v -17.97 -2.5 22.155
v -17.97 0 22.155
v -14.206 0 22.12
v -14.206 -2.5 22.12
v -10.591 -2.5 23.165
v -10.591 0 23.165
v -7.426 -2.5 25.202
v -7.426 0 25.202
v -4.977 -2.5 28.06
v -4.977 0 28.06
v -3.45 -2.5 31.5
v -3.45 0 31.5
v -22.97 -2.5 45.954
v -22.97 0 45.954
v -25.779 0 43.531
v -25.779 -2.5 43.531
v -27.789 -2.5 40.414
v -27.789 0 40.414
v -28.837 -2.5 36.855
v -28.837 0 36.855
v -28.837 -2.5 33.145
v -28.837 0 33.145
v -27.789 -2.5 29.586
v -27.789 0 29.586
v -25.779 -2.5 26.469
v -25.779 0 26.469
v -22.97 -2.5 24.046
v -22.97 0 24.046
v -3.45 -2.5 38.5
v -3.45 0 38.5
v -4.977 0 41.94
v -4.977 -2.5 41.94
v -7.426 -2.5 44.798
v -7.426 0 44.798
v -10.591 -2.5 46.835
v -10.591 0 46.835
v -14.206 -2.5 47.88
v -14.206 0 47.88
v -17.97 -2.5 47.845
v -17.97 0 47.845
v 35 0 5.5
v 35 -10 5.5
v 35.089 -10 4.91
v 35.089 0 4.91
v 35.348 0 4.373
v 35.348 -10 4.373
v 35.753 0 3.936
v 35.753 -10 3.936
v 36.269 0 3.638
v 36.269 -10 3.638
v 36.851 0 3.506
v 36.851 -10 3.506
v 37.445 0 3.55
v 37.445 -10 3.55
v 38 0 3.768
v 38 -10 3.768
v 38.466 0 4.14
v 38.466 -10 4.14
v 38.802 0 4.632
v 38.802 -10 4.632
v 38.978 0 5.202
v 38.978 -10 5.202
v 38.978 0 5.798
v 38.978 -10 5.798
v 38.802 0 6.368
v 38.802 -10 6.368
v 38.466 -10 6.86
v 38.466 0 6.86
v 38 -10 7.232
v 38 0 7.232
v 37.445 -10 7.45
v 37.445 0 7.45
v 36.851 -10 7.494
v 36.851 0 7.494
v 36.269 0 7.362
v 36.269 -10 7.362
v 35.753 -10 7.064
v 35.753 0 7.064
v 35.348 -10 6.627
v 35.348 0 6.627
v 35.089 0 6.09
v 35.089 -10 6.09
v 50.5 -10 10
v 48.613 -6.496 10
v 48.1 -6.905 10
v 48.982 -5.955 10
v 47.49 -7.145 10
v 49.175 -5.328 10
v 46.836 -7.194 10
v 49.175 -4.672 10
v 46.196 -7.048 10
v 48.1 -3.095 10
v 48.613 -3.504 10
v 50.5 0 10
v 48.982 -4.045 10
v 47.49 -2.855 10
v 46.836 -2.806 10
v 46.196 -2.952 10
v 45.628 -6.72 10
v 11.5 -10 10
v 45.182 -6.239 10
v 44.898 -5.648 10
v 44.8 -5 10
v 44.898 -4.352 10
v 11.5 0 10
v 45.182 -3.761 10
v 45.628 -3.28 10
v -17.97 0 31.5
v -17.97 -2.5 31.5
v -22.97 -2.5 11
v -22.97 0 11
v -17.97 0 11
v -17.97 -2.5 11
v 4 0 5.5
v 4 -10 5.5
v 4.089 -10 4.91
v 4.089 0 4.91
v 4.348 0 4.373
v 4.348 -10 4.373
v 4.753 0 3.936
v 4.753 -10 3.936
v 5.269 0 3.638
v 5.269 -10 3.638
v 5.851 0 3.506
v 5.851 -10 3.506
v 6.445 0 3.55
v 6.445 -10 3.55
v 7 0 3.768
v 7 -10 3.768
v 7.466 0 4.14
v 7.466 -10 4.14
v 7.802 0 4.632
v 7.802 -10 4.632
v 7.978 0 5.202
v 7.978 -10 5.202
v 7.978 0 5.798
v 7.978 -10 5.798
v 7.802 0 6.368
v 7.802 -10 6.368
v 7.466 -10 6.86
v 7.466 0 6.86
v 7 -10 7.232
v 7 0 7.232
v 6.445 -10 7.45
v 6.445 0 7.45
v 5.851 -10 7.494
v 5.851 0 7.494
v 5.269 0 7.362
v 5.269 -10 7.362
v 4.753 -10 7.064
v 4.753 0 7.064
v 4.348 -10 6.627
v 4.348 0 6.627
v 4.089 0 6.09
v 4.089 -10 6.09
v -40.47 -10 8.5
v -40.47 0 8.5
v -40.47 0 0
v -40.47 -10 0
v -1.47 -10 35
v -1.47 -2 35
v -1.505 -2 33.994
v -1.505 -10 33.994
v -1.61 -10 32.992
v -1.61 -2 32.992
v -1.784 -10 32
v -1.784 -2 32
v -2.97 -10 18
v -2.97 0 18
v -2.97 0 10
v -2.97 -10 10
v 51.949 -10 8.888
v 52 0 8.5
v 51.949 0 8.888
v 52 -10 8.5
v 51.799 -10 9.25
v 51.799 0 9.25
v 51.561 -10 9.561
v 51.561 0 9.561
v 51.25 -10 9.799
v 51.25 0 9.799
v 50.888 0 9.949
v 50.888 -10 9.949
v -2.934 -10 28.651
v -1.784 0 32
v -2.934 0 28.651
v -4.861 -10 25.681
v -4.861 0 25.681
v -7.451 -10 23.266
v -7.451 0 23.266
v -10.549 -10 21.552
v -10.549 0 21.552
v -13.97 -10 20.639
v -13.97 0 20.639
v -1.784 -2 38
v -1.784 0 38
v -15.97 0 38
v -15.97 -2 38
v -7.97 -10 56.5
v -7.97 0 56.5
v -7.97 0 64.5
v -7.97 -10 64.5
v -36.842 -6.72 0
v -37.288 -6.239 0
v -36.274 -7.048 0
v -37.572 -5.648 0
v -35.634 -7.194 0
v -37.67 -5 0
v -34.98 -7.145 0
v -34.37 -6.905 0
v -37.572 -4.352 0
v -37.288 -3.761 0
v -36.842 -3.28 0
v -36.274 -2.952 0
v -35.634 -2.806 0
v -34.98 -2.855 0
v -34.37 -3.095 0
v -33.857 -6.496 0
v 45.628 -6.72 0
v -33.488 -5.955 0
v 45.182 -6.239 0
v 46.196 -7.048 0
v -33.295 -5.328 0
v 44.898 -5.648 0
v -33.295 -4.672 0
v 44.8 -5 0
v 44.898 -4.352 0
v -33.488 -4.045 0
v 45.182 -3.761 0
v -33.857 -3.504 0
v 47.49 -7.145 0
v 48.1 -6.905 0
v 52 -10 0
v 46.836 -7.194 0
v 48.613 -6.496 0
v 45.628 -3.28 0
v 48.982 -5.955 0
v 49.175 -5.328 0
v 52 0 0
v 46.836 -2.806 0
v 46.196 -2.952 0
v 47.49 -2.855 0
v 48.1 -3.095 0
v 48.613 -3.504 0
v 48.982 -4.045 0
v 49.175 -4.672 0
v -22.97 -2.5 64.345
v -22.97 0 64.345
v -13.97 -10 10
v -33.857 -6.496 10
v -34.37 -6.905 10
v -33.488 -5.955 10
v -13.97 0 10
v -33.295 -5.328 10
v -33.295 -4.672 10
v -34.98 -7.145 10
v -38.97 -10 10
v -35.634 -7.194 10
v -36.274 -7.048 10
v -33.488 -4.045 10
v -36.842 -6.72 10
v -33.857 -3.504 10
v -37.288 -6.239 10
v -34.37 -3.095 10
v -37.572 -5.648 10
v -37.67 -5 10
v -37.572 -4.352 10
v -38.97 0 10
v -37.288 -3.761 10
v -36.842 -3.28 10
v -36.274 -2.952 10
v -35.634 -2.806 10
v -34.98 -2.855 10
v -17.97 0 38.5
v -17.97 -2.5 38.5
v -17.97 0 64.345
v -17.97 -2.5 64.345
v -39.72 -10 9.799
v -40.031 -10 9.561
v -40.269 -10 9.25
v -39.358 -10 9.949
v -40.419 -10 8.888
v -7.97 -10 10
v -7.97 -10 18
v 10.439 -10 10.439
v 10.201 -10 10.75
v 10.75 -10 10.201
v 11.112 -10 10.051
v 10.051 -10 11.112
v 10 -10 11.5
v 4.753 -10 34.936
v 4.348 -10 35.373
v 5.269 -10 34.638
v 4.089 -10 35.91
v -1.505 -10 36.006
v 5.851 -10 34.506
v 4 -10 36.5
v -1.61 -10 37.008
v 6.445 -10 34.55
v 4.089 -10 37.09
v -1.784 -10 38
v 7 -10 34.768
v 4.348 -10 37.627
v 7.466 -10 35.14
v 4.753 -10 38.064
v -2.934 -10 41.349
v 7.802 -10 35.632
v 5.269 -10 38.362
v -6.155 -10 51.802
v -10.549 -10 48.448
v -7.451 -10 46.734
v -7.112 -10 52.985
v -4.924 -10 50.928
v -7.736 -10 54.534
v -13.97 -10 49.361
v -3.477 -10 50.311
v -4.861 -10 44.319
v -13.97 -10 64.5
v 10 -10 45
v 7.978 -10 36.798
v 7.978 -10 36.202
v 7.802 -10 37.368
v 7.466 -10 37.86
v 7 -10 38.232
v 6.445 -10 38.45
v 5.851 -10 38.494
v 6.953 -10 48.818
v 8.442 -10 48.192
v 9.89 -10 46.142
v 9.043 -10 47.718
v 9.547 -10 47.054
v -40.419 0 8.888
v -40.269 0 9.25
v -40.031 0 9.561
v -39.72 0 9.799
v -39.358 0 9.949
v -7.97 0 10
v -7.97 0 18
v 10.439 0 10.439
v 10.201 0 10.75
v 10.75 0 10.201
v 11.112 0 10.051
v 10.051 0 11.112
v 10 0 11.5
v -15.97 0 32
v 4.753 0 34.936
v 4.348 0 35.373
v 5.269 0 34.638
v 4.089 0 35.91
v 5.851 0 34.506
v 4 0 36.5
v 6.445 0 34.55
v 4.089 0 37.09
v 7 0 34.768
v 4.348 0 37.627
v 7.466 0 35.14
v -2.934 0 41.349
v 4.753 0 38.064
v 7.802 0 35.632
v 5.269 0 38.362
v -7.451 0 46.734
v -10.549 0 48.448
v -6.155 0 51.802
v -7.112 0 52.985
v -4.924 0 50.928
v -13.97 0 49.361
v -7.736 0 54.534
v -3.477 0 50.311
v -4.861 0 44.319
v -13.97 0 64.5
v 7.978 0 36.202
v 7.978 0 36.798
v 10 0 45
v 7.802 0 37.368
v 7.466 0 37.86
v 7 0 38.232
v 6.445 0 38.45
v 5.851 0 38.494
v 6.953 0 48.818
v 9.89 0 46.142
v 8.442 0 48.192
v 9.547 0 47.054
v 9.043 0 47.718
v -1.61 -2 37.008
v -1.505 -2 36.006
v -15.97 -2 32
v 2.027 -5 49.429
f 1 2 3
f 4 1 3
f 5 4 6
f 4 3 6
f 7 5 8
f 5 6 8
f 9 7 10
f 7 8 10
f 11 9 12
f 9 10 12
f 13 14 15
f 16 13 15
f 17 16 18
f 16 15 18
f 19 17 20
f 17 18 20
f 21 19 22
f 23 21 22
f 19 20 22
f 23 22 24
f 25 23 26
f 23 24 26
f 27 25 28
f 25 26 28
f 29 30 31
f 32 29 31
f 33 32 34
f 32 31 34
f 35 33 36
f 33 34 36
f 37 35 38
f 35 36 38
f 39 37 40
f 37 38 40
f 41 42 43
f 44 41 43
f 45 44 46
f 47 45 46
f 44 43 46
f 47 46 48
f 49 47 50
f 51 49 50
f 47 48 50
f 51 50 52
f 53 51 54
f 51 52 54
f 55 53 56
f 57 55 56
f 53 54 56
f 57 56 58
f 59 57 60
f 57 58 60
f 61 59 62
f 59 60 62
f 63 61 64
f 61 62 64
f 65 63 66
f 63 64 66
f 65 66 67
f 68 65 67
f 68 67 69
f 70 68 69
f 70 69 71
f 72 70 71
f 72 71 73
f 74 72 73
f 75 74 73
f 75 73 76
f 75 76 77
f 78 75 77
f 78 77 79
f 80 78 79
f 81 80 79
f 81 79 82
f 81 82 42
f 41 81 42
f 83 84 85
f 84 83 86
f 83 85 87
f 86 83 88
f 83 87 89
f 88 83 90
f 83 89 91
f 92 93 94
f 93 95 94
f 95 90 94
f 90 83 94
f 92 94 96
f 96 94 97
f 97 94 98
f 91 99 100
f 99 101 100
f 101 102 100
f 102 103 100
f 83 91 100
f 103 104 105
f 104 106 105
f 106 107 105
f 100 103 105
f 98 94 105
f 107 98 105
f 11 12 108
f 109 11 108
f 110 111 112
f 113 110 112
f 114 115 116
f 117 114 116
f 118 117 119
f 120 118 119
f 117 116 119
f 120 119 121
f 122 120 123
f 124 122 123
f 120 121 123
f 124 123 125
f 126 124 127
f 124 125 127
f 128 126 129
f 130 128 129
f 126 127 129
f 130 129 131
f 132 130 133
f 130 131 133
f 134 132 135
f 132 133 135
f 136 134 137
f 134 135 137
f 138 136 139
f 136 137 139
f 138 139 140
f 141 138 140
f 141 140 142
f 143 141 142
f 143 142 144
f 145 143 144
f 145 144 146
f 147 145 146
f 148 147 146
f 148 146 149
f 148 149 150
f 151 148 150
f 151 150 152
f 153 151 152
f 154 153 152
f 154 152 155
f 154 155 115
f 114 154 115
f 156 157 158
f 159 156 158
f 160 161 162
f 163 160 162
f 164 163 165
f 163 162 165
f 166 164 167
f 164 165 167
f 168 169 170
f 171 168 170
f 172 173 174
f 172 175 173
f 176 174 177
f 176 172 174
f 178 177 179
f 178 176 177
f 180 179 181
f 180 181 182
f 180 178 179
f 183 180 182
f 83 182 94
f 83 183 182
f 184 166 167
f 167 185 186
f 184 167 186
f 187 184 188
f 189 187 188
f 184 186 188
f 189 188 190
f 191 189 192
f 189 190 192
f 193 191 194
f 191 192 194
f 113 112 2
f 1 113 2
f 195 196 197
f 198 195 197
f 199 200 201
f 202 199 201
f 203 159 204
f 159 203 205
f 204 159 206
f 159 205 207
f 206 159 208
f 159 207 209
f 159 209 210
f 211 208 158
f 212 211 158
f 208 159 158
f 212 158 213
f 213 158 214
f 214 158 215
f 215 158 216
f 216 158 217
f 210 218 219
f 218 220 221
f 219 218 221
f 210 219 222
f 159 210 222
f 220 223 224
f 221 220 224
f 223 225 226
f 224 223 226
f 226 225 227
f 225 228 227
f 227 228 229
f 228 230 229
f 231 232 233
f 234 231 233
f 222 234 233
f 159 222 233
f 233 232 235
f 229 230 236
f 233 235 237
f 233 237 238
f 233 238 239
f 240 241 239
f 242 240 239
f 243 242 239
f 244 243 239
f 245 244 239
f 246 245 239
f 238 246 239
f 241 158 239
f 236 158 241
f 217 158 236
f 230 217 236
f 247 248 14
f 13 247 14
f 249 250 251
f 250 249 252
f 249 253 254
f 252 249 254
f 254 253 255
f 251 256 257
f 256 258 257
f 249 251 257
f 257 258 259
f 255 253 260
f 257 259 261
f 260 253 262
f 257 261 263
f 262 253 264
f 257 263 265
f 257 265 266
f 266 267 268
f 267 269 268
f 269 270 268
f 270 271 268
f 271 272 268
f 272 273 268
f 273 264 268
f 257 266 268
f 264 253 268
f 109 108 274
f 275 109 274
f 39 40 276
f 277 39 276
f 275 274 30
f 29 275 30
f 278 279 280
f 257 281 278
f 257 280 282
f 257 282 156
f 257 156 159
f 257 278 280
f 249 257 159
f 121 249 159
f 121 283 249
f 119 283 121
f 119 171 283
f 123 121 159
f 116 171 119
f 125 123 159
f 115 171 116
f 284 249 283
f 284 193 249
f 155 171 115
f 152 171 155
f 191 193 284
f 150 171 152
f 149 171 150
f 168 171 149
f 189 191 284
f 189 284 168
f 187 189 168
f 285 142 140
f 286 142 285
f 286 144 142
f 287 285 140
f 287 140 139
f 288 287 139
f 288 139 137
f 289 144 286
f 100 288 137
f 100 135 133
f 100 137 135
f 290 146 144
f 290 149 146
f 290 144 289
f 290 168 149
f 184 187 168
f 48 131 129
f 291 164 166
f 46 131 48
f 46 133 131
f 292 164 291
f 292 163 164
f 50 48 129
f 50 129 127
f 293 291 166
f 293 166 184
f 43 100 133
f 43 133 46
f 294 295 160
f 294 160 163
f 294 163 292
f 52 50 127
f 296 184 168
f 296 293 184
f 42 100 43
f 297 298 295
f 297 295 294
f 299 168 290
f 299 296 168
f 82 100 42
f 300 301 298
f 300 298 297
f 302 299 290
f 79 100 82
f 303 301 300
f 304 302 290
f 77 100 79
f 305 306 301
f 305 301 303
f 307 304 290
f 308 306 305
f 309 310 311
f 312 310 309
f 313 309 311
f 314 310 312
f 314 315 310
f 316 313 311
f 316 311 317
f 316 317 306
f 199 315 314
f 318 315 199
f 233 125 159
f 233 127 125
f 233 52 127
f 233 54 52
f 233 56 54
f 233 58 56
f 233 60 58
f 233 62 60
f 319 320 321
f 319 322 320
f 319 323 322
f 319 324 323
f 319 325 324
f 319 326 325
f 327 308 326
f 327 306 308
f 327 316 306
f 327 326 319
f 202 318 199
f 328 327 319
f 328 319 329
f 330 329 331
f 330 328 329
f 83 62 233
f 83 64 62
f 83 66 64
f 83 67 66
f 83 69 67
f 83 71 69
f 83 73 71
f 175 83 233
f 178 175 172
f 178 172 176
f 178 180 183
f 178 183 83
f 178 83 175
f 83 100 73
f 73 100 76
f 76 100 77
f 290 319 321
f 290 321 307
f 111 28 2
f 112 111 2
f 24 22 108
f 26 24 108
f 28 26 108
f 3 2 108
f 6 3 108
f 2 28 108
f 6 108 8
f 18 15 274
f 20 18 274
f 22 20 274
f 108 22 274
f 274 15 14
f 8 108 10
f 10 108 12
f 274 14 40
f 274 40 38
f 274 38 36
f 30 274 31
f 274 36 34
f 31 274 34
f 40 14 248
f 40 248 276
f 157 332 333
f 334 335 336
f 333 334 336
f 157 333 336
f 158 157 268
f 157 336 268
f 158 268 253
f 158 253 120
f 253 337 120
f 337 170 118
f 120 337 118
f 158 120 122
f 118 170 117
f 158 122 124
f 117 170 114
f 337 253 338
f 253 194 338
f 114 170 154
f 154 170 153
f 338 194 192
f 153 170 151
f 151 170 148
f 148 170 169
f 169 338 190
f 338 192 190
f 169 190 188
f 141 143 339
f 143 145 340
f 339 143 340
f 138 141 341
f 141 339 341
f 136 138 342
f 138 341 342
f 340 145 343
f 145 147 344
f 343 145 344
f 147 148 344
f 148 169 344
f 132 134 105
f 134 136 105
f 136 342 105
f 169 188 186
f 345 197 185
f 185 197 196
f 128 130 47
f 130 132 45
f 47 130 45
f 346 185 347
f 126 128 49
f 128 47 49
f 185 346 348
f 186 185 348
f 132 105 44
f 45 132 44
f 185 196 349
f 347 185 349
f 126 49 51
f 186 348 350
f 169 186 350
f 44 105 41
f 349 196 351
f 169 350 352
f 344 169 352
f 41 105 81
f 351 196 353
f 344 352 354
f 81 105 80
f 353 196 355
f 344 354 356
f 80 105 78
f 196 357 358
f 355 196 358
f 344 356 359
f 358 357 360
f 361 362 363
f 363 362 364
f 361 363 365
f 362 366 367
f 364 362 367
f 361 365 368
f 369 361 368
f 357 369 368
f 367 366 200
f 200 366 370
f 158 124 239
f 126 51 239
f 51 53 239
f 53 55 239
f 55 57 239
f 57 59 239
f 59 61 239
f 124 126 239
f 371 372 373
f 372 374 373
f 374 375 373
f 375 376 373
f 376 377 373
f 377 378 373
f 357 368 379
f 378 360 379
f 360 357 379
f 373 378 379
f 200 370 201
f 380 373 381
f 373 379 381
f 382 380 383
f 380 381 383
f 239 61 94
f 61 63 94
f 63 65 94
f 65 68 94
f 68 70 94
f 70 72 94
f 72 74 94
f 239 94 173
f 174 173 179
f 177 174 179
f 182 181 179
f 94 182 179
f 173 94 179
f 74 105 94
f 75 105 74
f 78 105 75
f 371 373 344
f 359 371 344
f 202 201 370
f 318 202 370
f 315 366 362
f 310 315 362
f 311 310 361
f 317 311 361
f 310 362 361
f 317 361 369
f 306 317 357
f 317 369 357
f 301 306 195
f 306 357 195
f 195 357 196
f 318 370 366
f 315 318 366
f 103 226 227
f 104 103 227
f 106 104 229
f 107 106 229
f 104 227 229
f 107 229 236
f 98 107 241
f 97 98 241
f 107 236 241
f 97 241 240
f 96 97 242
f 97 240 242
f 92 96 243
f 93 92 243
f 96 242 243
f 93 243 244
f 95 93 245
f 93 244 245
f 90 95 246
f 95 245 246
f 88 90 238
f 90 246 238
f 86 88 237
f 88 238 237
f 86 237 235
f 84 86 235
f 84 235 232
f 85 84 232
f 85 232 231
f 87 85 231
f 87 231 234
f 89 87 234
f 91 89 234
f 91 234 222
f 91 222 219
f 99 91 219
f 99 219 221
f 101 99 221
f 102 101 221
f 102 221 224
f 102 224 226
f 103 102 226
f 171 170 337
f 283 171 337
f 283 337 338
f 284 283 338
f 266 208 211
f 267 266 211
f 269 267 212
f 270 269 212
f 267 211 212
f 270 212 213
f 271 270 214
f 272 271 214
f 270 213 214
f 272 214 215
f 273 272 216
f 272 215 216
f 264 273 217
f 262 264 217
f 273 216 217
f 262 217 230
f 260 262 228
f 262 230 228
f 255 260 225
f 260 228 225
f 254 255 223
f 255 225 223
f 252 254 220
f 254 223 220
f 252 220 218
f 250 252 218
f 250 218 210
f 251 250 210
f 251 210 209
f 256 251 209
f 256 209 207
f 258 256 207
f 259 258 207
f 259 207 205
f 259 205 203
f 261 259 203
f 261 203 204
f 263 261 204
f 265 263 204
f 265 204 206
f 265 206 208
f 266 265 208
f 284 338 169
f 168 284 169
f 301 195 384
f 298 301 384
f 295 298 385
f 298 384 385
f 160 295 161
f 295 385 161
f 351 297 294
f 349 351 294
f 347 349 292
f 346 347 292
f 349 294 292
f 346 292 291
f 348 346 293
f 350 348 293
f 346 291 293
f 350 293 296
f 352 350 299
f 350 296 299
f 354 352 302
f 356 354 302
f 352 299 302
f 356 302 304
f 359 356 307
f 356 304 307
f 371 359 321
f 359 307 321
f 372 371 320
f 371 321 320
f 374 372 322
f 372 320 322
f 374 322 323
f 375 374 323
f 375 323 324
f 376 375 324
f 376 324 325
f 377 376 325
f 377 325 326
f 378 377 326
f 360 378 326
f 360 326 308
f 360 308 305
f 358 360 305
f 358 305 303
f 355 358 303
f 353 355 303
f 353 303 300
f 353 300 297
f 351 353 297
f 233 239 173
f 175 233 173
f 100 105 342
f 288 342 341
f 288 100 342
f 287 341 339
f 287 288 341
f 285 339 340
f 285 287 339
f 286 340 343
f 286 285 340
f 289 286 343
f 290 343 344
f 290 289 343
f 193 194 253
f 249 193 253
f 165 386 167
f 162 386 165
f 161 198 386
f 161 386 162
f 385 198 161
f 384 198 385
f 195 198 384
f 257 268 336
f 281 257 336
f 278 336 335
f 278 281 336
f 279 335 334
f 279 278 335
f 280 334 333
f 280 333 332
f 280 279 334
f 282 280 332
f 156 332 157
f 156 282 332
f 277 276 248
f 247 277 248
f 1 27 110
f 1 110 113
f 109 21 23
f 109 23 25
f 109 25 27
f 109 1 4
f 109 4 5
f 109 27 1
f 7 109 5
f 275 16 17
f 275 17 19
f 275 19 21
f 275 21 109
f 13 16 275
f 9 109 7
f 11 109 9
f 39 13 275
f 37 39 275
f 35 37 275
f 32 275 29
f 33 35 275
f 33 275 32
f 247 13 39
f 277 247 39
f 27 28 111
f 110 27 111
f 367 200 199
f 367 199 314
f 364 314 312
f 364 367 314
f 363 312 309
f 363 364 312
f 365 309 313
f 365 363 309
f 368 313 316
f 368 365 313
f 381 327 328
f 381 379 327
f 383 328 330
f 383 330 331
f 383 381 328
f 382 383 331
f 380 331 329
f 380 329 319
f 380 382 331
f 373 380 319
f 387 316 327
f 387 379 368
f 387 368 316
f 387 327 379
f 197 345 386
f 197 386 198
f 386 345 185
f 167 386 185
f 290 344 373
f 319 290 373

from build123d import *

# Parameters (mm, degrees)
F1_DEPTH = 10
F2_D     = 4
F0_W     = 2
F0_H     = 6
F3_DEPTH = 2
F5_DEPTH = 2.5
F7_D     = 4.4
F8_R     = 1.5


with BuildPart() as f1:
    # F0 (on Front) → F1 (new body)
    with BuildSketch(Plane.XZ):
        Polygon((-30.4699879904, 0), (0, 0), (52, 0), (52, 10), (10, 10), (0, 10), (-2.9699879904, 10), (-7.9699879904, 10), (-13.9699879904, 10), (-30.4699879904, 10), (-40.4699879904, 10), (-40.4699879904, 0), align=None)
        with BuildLine():
            Line((0, 10), (10, 10))
            Line((10, 10), (10, 45))
            add(Edge.make_bspline(
                [(-7.9699879904, 56.5), (-7.9173985869, 50.464976579), (1.67252567, 49.2066189983), (10.0459149107, 49.04044047), (10, 45)],
                knots=[0, 0, 0, 0, 0.5367611097, 1, 1, 1, 1], degree=3))
            Line((-7.9699879904, 56.5), (-7.9699879904, 64.5))
            Line((-7.9699879904, 64.5), (-13.9699879904, 64.5))
            Line((-13.9699879904, 64.5), (-13.9699879904, 49.3614066163))
            ThreePointArc((-13.9699879904, 49.3614066163), (-6.0821595617, 45.6056988909), (-1.7837270313, 38))
            Line((-1.7837270313, 38), (0, 38))
            Line((0, 38), (0, 32))
            Line((0, 32), (-1.7837270313, 32))
            ThreePointArc((-1.7837270313, 32), (-6.0821595617, 24.3943011091), (-13.9699879904, 20.6385933837))
            Line((-13.9699879904, 20.6385933837), (-13.9699879904, 10))
            Line((-13.9699879904, 10), (-7.9699879904, 10))
            Line((-7.9699879904, 10), (-7.9699879904, 18))
            Line((-7.9699879904, 18), (-2.9699879904, 18))
            Line((-2.9699879904, 18), (-2.9699879904, 10))
            Line((-2.9699879904, 10), (0, 10))
        make_face()
        with BuildLine():
            ThreePointArc((-1.4699879904, 35), (-1.5486360443, 33.491819624), (-1.7837270313, 32))
            Line((-1.7837270313, 32), (0, 32))
            Line((0, 32), (0, 38))
            Line((0, 38), (-1.7837270313, 38))
            ThreePointArc((-1.7837270313, 38), (-1.5486360443, 36.508180376), (-1.4699879904, 35))
        make_face()
    extrude(amount=F1_DEPTH)

    # F2 (through all)
    with Locations(Plane(origin=(0, 0, 0), x_dir=(1, 0, 0), z_dir=(0, 1, 0))):
        with Locations((6, -36.5), (6, -5.5), (37, -5.5)):
            Hole(F2_D / 2)

    # F0 (on Front) → F3 (join)
    with BuildSketch(Plane.XZ):
        with BuildLine():
            Line((-13.9699879904, 32), (-1.7837270313, 32))
            ThreePointArc((-1.7837270313, 32), (-1.5486360443, 33.491819624), (-1.4699879904, 35))
            ThreePointArc((-1.4699879904, 35), (-1.5486360443, 36.508180376), (-1.7837270313, 38))
            Line((-1.7837270313, 38), (-13.9699879904, 38))
            Line((-13.9699879904, 38), (-13.9699879904, 32))
        make_face()
        with Locations((-14.9699879904, 35)):
            Rectangle(F0_W, F0_H)
    extrude(amount=F3_DEPTH)

    # F7 (through all)
    with Locations(Plane.XY.offset(10)):
        with Locations((47, -5), (-35.4699879904, -5)):
            Hole(F7_D / 2)

    # F8
    f8_edges = [f1.edges().sort_by_distance(p)[0] for p in [
        (-40.469988, -5, 10),
        (10, -5, 45),
        (10, -5, 10),
        (52, -5, 10),
    ]]
    fillet(f8_edges, radius=F8_R)


with BuildPart() as f5:
    # F4 (on Front) → F5 (new body)
    with BuildSketch(Plane.XZ):
        with BuildLine():
            Line((-17.9699879904, 38.5), (-3.4500039648, 38.5))
            ThreePointArc((-3.4500039648, 38.5), (-8.9343033072, 45.9315662665), (-17.9699879904, 47.8452325787))
            ThreePointArc((-17.9699879904, 47.8452325787), (-20.5682228259, 47.1596149773), (-22.9699879904, 45.9544511501))
            ThreePointArc((-22.9699879904, 45.9544511501), (-28.9699879904, 35), (-22.9699879904, 24.0455488499))
            ThreePointArc((-22.9699879904, 24.0455488499), (-20.5682228259, 22.8403850227), (-17.9699879904, 22.1547674213))
            ThreePointArc((-17.9699879904, 22.1547674213), (-8.9343033072, 24.0684337335), (-3.4500039648, 31.5))
            Line((-3.4500039648, 31.5), (-17.9699879904, 31.5))
            Line((-17.9699879904, 31.5), (-17.9699879904, 38.5))
        make_face()
        with BuildLine():
            ThreePointArc((-22.9699879904, 45.9544511501), (-20.5682228259, 47.1596149773), (-17.9699879904, 47.8452325787))
            Line((-17.9699879904, 47.8452325787), (-17.9699879904, 64.3452325787))
            Line((-17.9699879904, 64.3452325787), (-22.9699879904, 64.3452325787))
            Line((-22.9699879904, 64.3452325787), (-22.9699879904, 45.9544511501))
        make_face()
        with BuildLine():
            Line((-17.9699879904, 11), (-17.9699879904, 22.1547674213))
            ThreePointArc((-17.9699879904, 22.1547674213), (-20.5682228259, 22.8403850227), (-22.9699879904, 24.0455488499))
            Line((-22.9699879904, 24.0455488499), (-22.9699879904, 11))
            Line((-22.9699879904, 11), (-17.9699879904, 11))
        make_face()
    extrude(amount=F5_DEPTH)


solid = Compound([f1.part, f5.part])
